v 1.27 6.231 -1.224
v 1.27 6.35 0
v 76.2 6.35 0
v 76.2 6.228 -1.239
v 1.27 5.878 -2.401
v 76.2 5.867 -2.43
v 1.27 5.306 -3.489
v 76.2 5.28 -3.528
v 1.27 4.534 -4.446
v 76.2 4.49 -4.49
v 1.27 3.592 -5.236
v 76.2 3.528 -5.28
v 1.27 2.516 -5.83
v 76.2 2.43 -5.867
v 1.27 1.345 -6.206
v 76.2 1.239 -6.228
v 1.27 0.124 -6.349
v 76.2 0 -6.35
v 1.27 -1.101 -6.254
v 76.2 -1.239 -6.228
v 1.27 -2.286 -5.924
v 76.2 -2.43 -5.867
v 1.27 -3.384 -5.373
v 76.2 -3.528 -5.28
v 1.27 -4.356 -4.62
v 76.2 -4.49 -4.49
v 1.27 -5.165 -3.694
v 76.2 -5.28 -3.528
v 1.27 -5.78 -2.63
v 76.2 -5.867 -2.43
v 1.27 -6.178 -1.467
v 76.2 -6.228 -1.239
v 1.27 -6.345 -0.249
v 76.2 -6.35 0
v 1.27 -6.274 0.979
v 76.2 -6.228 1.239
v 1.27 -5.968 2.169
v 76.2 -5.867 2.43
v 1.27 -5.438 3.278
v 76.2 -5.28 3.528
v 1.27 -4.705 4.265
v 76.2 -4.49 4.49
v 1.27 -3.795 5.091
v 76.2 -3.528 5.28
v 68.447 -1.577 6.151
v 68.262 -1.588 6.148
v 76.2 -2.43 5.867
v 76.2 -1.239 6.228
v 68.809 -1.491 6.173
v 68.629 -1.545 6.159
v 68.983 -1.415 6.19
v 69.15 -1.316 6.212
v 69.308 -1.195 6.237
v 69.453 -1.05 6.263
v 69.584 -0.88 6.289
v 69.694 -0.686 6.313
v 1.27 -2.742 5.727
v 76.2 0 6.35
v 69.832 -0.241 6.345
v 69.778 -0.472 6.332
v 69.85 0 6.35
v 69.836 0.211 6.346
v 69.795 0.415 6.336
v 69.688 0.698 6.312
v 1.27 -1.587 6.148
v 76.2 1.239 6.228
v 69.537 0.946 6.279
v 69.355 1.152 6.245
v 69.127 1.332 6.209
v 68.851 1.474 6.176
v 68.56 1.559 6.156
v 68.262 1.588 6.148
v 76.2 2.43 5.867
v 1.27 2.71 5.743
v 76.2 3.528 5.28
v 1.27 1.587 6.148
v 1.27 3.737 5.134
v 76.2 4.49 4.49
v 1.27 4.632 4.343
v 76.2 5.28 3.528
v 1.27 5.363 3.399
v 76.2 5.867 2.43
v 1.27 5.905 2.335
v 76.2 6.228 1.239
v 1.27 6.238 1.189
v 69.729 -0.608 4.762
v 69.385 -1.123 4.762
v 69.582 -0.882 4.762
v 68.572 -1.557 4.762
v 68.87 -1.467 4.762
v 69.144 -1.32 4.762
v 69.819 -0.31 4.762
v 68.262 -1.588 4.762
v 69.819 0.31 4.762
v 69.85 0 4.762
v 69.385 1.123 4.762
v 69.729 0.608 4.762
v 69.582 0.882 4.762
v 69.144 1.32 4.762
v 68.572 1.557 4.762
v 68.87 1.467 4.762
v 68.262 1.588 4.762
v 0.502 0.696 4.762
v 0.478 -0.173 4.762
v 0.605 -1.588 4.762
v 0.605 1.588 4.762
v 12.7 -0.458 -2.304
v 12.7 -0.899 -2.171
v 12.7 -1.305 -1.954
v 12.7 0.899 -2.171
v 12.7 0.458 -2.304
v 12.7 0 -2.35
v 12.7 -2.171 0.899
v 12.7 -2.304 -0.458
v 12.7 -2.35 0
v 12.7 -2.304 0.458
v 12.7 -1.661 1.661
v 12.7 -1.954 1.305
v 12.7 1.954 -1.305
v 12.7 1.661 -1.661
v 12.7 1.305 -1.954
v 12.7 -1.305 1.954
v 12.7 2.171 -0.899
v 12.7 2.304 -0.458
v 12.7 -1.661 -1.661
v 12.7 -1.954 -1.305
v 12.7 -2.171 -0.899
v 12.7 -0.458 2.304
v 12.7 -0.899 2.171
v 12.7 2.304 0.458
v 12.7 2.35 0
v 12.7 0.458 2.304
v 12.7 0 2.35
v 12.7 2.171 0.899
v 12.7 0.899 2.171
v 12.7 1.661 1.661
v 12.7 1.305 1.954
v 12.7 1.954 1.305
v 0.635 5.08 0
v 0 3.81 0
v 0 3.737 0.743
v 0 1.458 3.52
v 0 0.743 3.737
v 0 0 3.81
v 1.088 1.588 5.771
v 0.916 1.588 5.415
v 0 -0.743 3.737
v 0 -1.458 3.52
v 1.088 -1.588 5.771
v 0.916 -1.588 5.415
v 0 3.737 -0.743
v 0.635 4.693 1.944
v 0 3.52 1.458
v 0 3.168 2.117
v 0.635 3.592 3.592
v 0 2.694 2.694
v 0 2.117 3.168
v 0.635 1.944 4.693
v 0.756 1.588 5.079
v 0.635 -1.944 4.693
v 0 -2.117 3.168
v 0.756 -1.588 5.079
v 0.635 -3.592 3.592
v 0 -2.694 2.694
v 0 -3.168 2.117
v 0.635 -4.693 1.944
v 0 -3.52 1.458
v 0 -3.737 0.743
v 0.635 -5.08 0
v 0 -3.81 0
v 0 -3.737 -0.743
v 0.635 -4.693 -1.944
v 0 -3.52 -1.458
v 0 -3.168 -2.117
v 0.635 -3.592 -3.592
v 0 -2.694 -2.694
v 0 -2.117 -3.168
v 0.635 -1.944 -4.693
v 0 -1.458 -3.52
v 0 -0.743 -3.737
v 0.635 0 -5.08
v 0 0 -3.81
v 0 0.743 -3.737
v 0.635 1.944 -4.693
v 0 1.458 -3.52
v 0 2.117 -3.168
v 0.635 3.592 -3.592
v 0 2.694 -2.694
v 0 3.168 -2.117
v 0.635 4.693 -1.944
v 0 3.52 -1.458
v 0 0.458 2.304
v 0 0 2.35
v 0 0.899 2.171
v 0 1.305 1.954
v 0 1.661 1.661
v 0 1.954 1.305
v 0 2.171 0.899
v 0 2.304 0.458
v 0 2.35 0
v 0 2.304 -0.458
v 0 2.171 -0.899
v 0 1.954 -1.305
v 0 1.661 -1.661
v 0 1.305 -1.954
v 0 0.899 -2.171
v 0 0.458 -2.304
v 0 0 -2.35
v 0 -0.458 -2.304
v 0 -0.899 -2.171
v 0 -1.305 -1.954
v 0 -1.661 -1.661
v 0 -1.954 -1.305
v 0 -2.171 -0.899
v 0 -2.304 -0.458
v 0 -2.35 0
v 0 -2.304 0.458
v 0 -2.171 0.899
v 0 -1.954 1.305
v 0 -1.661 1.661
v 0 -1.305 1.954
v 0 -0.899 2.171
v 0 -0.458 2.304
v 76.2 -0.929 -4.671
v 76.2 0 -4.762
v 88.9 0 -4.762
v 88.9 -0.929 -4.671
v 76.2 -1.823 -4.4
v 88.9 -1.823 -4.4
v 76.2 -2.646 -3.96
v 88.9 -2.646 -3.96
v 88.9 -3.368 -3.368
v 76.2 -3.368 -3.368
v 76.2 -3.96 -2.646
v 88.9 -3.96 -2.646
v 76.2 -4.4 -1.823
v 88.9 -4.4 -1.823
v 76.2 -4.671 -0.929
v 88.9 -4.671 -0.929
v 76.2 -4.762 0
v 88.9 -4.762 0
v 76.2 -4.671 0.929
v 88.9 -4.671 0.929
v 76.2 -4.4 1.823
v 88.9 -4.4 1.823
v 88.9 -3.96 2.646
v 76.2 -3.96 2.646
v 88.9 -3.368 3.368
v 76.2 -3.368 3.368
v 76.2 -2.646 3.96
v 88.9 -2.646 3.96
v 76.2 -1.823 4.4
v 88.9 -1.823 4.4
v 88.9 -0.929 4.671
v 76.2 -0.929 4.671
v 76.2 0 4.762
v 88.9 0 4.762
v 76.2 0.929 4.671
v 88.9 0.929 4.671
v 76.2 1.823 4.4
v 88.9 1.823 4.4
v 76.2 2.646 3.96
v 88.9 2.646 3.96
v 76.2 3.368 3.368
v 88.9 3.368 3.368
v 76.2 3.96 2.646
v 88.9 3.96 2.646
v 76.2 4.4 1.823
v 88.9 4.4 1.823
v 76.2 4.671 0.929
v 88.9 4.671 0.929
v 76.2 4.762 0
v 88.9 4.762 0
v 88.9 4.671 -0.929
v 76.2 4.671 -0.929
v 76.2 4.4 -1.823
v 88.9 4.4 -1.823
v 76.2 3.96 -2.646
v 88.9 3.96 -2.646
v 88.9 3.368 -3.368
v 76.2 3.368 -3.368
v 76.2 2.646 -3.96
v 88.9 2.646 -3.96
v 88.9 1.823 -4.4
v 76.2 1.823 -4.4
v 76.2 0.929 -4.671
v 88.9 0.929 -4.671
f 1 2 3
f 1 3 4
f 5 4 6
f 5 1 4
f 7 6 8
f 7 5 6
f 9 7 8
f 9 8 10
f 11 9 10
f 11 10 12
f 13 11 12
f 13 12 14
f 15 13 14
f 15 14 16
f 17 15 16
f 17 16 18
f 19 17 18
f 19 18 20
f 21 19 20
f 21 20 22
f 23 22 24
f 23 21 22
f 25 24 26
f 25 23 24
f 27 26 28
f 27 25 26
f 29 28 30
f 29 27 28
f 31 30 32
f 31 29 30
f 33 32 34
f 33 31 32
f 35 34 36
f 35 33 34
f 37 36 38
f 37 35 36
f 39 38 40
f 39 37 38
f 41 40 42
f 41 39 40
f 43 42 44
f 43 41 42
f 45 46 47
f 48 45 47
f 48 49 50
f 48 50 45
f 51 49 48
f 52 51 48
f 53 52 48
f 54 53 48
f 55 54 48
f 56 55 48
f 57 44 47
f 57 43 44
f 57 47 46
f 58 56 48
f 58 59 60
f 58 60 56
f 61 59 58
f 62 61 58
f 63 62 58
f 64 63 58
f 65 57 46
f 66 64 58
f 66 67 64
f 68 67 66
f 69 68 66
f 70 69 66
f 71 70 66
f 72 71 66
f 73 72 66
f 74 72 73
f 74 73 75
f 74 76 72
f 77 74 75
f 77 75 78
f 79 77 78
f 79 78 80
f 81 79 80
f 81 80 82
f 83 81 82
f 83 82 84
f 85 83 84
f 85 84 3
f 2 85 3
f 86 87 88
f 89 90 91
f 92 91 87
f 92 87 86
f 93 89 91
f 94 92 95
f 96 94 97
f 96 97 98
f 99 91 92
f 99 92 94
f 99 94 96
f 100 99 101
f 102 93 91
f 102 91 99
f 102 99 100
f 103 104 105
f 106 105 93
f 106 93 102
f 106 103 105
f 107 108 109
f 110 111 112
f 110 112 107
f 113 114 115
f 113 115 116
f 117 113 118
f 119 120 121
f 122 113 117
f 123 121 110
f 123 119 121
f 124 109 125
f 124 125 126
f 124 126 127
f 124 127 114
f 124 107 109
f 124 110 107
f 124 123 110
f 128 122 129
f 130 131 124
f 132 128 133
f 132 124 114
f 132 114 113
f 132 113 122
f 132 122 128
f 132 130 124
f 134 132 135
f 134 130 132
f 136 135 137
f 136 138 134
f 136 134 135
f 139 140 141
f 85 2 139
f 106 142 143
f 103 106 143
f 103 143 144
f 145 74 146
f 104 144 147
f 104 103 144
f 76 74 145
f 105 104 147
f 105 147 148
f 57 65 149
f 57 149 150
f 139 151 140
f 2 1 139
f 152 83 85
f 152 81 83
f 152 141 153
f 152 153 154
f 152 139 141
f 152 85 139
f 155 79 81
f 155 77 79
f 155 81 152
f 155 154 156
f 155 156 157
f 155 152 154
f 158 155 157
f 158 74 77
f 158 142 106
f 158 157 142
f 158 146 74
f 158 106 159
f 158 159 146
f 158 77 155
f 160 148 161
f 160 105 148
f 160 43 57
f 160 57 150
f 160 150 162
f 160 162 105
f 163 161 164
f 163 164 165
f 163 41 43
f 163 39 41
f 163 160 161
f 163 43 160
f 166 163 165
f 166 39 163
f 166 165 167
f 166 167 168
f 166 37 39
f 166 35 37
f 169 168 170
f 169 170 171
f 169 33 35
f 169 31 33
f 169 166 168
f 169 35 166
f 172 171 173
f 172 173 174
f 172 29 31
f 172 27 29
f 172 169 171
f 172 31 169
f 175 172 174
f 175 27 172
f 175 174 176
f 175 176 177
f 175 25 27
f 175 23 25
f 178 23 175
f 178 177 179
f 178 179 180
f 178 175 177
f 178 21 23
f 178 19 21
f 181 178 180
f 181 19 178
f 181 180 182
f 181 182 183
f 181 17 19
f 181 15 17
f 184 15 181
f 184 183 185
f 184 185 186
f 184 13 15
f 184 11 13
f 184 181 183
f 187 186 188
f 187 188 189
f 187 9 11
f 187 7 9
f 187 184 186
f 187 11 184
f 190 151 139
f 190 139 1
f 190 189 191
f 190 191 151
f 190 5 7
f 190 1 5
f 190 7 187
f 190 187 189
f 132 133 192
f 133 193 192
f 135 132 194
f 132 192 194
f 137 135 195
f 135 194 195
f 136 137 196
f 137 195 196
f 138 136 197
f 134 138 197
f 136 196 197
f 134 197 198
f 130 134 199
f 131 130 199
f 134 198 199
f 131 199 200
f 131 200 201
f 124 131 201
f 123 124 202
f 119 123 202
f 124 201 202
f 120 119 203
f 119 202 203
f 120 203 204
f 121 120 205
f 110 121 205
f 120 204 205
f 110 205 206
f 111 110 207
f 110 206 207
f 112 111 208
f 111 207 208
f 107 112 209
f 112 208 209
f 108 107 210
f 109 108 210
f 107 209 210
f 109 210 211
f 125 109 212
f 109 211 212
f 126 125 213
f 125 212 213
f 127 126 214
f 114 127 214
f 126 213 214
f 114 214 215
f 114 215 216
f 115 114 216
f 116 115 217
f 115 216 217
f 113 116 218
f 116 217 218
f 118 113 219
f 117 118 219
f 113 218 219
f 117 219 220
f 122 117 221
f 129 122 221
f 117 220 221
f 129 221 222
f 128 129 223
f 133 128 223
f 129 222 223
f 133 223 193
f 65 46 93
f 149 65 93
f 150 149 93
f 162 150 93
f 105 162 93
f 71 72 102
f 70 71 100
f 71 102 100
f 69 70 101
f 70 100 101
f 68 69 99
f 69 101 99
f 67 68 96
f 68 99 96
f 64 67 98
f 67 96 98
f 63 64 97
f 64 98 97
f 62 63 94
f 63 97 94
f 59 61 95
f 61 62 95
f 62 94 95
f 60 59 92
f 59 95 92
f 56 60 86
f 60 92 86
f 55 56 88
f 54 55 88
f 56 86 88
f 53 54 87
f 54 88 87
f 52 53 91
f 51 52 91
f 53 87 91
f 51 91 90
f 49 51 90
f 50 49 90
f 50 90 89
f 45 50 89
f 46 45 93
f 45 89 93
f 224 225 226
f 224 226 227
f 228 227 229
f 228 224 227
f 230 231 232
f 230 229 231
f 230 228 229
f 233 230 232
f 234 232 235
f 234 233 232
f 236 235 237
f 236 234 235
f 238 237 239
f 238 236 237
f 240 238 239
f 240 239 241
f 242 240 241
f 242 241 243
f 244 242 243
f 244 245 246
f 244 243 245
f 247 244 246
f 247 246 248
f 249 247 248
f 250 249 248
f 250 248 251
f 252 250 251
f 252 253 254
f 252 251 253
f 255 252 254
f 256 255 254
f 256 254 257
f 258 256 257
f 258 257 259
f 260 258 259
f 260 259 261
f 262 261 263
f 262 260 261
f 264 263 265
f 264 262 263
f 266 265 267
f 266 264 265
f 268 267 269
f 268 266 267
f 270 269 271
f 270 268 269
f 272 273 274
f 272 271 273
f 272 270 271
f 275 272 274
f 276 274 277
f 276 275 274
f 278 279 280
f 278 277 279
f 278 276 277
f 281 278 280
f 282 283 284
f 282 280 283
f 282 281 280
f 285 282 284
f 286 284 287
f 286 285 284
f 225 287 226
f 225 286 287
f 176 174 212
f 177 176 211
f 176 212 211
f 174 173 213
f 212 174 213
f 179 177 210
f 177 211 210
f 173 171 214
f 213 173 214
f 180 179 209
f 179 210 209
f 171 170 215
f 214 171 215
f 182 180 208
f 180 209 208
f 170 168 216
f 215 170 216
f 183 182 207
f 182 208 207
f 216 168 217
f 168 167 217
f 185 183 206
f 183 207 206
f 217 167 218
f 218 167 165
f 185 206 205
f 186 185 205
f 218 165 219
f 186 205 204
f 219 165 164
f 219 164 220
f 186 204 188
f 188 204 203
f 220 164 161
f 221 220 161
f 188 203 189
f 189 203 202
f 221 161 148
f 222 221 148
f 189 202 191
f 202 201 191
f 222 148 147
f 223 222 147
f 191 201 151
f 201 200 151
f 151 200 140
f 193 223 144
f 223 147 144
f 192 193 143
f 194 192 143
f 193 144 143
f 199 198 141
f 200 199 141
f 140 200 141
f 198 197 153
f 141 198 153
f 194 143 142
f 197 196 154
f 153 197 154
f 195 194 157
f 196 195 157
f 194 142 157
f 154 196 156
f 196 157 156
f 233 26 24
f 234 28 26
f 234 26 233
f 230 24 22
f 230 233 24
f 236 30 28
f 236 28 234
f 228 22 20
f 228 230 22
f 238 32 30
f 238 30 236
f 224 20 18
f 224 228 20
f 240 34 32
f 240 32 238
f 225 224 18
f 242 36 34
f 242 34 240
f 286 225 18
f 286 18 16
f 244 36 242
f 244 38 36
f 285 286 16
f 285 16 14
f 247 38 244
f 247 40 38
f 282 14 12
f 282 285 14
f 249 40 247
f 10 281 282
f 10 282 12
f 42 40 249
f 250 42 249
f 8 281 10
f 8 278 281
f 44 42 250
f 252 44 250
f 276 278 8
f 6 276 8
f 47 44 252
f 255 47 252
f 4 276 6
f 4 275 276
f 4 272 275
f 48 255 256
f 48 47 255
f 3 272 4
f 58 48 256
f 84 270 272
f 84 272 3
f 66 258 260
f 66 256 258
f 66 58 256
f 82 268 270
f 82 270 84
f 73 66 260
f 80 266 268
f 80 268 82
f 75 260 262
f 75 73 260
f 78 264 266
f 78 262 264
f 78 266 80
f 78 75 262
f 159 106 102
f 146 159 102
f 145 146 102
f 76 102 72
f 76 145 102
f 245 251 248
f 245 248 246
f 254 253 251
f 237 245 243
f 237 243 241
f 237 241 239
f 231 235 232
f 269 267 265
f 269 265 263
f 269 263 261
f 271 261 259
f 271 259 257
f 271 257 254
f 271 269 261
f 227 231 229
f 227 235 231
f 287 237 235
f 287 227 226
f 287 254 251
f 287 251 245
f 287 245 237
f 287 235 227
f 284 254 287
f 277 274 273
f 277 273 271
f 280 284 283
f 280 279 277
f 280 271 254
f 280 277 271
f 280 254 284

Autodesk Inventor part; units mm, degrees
ref_plane "YZ Plane" through (0, 0, 0) normal (1, 0, 0) x (0, 1, 0)
ref_plane "XZ Plane" through (0, 0, 0) normal (0, 1, 0) x (-1, 0, 0)
ref_plane "XY Plane" through (0, 0, 0) normal (0, 0, 1) x (1, 0, 0)
sketch "Sketch1" plane through (0, 0, 0) normal (1, 0, 0) x (0, 1, 0)
  circle A0 centre (0, 0) radius 6.35
  line L0 (0, 0) -> (0, 6.35) construction
  line L1 (-1.5875, 6.1484) -> (-1.5875, 4.7625)
  line L2 (-1.5875, 4.7625) -> (1.5875, 4.7625)
  line L3 (1.5875, 4.7625) -> (1.5875, 6.1484)
  point P0 (0, 4.7625)
  dimension "d0" = 12.7
  dimension "d2" = 1.5875
  dimension "d3" = 3.175
extrude "Extrusion1" add sketch "Sketch1" along normal blind 76.2
sketch "Sketch2" plane through (76.2, 0, 0) normal (1, 0, 0) x (0, 0, -1)
  circle A0 centre (0, 0) radius 6.35 projected
  circle A1 centre (0, 0) radius 4.7625
  dimension "d6" = 9.525
extrude "Extrusion2" add sketch "Sketch2" along normal blind 12.7 contours A1
extrude "Extrusion3" cut sketch "Sketch1" along normal blind 69.85 contours L3 L2 L1 A0 picked at (0.1781, 5.2842)
fillet "Fillet1" radius 1.5875 2 edges at (69.85, 1.5875, 5.4554) (69.85, -1.5875, 5.4554)
chamfer "Chamfer1" distance 1.27 distance2 2.54 1 edges at (0, 0, -6.35) measured on face at (50.8, -3.3725, 5.3804)
sketch "Sketch3" plane through (0, 0, 0) normal (-1, 0, 0) x (0, 0, 1)
  circle A0 centre (0, 0) radius 3.81 projected
  circle A1 centre (0, 0) radius 2.3495
  dimension "d16" = 4.699
extrude "Extrusion4" cut sketch "Sketch3" against normal blind 12.7 contours A1
thread "Thread1" size "10-32 UNF" class "2B" standard "ANSI Unified Screw Threads" full length
properties part number "Banebots 0.5x3 P60 Shaft" material "Steel, Carbon"
